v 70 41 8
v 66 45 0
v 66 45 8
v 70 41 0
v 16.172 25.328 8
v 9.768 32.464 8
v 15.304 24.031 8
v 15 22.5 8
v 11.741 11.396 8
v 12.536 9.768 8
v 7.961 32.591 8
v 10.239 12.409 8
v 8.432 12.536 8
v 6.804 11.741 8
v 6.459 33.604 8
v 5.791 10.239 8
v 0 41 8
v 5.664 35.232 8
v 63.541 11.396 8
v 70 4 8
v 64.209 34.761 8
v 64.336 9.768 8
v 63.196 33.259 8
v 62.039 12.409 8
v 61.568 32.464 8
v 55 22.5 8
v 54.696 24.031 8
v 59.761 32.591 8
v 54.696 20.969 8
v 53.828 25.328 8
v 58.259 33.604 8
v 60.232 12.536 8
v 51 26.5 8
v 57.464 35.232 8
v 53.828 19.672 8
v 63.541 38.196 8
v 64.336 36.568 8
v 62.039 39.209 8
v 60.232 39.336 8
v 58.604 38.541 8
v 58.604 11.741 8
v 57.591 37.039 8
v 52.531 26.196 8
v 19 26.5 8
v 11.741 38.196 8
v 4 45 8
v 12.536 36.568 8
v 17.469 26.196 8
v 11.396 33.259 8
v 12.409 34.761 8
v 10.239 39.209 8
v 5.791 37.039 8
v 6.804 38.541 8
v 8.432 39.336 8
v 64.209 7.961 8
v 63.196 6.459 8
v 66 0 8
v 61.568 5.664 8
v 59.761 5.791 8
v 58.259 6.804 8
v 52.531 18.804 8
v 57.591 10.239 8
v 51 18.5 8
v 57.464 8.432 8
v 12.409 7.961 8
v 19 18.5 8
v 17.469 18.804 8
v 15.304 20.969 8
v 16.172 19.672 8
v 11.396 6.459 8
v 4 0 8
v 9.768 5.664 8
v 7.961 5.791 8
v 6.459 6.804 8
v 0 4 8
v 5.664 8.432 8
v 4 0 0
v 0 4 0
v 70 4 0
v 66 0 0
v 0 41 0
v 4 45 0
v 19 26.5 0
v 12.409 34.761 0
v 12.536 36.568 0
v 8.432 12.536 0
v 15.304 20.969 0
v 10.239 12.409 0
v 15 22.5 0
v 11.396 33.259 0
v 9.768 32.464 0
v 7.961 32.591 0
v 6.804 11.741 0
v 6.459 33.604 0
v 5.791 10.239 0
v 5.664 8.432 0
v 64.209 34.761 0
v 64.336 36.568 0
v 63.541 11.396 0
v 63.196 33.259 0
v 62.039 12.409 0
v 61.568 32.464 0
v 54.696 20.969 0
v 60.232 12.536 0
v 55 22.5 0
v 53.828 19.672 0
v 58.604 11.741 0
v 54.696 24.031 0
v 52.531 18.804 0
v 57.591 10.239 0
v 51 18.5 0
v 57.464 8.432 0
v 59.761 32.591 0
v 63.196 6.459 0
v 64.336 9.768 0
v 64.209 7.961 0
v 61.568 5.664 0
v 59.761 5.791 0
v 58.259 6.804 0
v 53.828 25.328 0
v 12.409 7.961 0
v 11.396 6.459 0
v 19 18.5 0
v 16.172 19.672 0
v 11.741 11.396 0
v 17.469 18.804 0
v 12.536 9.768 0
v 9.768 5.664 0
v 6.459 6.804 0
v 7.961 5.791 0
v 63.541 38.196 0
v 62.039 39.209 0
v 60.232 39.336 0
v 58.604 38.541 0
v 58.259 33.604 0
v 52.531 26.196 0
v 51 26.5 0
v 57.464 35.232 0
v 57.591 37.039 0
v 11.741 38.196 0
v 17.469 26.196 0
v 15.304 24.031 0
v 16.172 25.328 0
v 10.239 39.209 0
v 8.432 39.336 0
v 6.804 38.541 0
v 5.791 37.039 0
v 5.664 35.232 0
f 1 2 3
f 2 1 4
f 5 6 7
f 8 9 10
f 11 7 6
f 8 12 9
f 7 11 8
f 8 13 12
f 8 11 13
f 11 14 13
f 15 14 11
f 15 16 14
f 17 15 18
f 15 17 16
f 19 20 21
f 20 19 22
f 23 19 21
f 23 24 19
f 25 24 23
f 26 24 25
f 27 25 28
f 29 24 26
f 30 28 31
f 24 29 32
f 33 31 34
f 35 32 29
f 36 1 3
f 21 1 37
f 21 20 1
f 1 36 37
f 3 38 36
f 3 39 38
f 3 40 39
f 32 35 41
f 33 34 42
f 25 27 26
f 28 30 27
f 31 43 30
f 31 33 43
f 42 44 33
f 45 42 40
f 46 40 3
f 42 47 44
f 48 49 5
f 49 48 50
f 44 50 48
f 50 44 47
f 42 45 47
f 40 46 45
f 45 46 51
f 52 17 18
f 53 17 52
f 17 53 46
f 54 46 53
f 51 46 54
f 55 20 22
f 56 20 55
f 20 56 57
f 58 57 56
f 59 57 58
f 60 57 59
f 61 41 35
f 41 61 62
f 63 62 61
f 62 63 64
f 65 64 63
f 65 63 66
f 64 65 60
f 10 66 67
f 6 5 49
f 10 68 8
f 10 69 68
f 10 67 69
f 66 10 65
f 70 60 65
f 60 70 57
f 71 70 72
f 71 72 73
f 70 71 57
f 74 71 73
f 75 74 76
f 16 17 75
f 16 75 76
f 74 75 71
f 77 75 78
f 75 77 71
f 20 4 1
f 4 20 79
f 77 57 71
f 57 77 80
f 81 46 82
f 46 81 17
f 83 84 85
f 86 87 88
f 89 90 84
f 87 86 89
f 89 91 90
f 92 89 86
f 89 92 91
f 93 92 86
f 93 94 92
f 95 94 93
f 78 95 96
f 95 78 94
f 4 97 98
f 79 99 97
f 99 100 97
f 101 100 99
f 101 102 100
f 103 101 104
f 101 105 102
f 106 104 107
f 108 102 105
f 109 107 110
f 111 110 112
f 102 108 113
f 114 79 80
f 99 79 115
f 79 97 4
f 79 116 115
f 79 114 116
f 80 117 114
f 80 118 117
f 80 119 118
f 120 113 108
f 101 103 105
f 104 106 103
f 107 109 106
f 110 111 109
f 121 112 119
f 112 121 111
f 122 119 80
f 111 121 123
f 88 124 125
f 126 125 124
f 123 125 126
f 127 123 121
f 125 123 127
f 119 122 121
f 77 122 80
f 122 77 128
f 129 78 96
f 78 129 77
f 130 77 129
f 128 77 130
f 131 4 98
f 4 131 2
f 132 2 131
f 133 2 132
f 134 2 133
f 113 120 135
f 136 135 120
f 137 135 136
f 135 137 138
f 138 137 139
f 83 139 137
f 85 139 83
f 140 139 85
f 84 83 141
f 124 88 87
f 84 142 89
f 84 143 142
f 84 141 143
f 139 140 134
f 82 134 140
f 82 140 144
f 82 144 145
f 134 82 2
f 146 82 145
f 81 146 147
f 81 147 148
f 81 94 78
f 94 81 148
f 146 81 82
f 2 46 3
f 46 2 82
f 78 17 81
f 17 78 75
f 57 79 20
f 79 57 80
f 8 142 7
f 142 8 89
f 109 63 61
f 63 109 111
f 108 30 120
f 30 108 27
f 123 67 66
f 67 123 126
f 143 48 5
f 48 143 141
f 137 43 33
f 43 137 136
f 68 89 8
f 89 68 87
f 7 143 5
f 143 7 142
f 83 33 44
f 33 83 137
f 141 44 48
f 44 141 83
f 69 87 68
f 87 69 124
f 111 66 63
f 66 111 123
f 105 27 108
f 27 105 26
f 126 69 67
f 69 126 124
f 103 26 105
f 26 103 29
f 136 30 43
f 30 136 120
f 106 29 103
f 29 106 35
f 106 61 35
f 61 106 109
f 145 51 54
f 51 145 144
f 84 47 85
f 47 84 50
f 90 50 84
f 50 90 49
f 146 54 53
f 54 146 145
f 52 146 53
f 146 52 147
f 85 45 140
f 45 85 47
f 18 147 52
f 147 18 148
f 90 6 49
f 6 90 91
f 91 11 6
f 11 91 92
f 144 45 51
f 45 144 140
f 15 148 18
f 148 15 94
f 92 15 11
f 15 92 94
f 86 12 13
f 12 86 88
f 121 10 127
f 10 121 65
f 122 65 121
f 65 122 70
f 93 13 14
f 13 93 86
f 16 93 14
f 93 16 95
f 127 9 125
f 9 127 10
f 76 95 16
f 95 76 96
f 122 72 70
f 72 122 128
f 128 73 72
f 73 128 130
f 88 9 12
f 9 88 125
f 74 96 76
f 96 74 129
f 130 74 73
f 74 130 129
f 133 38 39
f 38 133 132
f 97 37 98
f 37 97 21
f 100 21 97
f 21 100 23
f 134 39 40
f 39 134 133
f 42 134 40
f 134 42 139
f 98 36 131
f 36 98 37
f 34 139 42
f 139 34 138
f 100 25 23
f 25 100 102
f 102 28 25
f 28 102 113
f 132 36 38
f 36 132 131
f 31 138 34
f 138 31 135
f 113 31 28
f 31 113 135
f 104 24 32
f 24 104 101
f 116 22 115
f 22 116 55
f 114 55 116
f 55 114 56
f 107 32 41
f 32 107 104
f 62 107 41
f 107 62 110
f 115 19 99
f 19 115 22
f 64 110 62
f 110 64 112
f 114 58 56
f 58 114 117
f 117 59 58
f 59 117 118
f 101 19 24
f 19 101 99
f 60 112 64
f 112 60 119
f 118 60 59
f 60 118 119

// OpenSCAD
$fn = 32;

// ----------------------------------------------------------------------
// Bracket plate: slot plate 70 x 45
// ----------------------------------------------------------------------

// --- parameters (mm) ---
hole_r = 3.5;             // bolt hole radius
plate_t = 8;              // plate thickness, Z (extrusion height)
plate_l = 70;             // plate length
plate_w = 45;             // plate width
slot_l = 32;              // slot straight length
slot_r = 4;               // slot end radius

slot_len = slot_l + 2 * slot_r;
slot_w = 2 * slot_r;
hole_d2 = 2 * hole_r;

profile = [[4, 0], [66, 0], [70, 4], [70, 41], [66, 45], [4, 45], [0, 41], [0, 4]];  // primary outline, 8 points, counter clockwise
void_1 = [[51, 18.5], [52.531, 18.804], [53.828, 19.672], [54.696, 20.969], [55, 22.5], [54.696, 24.031], [53.828, 25.328], [52.531, 26.196], [51, 26.5], [19, 26.5], [17.469, 26.196], [16.172, 25.328], [15.304, 24.031], [15, 22.5], [15.304, 20.969], [16.172, 19.672], [17.469, 18.804], [19, 18.5]];  // grip slot, 18 points
void_2 = [[12.536, 36.568], [11.741, 38.196], [10.239, 39.209], [8.432, 39.336], [6.804, 38.541], [5.791, 37.039], [5.664, 35.232], [6.459, 33.604], [7.961, 32.591], [9.768, 32.464], [11.396, 33.259], [12.409, 34.761]];  // corner hole, 12 points
void_3 = [[12.536, 9.768], [11.741, 11.396], [10.239, 12.409], [8.432, 12.536], [6.804, 11.741], [5.791, 10.239], [5.664, 8.432], [6.459, 6.804], [7.961, 5.791], [9.768, 5.664], [11.396, 6.459], [12.409, 7.961]];  // corner hole, 12 points
void_4 = [[64.336, 36.568], [63.541, 38.196], [62.039, 39.209], [60.232, 39.336], [58.604, 38.541], [57.591, 37.039], [57.464, 35.232], [58.259, 33.604], [59.761, 32.591], [61.568, 32.464], [63.196, 33.259], [64.209, 34.761]];  // corner hole, 12 points
void_5 = [[64.336, 9.768], [63.541, 11.396], [62.039, 12.409], [60.232, 12.536], [58.604, 11.741], [57.591, 10.239], [57.464, 8.432], [58.259, 6.804], [59.761, 5.791], [61.568, 5.664], [63.196, 6.459], [64.209, 7.961]];  // corner hole, 12 points

// --- the one profile operation ---
difference() {
  linear_extrude(height = plate_t) polygon(points = profile);
  translate([0, 0, -1])
    linear_extrude(height = plate_t + 2) polygon(points = void_1);
  translate([0, 0, -1])
    linear_extrude(height = plate_t + 2) polygon(points = void_2);
  translate([0, 0, -1])
    linear_extrude(height = plate_t + 2) polygon(points = void_3);
  translate([0, 0, -1])
    linear_extrude(height = plate_t + 2) polygon(points = void_4);
  translate([0, 0, -1])
    linear_extrude(height = plate_t + 2) polygon(points = void_5);
}
